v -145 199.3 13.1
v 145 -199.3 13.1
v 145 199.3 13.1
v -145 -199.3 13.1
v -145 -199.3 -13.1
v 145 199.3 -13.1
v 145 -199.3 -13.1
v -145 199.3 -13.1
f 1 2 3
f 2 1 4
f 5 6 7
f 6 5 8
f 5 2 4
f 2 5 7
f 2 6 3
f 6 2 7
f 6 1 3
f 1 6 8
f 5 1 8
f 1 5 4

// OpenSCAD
// parameters

/// laptop dims
$lh = 26.2;
$ld = 398.6;
$lw = 290.0;

/// wood dims
$thickness = 20.0;
$clearance = 20.0;

// laptop
cube([$lw,$ld,$lh], center=true);
